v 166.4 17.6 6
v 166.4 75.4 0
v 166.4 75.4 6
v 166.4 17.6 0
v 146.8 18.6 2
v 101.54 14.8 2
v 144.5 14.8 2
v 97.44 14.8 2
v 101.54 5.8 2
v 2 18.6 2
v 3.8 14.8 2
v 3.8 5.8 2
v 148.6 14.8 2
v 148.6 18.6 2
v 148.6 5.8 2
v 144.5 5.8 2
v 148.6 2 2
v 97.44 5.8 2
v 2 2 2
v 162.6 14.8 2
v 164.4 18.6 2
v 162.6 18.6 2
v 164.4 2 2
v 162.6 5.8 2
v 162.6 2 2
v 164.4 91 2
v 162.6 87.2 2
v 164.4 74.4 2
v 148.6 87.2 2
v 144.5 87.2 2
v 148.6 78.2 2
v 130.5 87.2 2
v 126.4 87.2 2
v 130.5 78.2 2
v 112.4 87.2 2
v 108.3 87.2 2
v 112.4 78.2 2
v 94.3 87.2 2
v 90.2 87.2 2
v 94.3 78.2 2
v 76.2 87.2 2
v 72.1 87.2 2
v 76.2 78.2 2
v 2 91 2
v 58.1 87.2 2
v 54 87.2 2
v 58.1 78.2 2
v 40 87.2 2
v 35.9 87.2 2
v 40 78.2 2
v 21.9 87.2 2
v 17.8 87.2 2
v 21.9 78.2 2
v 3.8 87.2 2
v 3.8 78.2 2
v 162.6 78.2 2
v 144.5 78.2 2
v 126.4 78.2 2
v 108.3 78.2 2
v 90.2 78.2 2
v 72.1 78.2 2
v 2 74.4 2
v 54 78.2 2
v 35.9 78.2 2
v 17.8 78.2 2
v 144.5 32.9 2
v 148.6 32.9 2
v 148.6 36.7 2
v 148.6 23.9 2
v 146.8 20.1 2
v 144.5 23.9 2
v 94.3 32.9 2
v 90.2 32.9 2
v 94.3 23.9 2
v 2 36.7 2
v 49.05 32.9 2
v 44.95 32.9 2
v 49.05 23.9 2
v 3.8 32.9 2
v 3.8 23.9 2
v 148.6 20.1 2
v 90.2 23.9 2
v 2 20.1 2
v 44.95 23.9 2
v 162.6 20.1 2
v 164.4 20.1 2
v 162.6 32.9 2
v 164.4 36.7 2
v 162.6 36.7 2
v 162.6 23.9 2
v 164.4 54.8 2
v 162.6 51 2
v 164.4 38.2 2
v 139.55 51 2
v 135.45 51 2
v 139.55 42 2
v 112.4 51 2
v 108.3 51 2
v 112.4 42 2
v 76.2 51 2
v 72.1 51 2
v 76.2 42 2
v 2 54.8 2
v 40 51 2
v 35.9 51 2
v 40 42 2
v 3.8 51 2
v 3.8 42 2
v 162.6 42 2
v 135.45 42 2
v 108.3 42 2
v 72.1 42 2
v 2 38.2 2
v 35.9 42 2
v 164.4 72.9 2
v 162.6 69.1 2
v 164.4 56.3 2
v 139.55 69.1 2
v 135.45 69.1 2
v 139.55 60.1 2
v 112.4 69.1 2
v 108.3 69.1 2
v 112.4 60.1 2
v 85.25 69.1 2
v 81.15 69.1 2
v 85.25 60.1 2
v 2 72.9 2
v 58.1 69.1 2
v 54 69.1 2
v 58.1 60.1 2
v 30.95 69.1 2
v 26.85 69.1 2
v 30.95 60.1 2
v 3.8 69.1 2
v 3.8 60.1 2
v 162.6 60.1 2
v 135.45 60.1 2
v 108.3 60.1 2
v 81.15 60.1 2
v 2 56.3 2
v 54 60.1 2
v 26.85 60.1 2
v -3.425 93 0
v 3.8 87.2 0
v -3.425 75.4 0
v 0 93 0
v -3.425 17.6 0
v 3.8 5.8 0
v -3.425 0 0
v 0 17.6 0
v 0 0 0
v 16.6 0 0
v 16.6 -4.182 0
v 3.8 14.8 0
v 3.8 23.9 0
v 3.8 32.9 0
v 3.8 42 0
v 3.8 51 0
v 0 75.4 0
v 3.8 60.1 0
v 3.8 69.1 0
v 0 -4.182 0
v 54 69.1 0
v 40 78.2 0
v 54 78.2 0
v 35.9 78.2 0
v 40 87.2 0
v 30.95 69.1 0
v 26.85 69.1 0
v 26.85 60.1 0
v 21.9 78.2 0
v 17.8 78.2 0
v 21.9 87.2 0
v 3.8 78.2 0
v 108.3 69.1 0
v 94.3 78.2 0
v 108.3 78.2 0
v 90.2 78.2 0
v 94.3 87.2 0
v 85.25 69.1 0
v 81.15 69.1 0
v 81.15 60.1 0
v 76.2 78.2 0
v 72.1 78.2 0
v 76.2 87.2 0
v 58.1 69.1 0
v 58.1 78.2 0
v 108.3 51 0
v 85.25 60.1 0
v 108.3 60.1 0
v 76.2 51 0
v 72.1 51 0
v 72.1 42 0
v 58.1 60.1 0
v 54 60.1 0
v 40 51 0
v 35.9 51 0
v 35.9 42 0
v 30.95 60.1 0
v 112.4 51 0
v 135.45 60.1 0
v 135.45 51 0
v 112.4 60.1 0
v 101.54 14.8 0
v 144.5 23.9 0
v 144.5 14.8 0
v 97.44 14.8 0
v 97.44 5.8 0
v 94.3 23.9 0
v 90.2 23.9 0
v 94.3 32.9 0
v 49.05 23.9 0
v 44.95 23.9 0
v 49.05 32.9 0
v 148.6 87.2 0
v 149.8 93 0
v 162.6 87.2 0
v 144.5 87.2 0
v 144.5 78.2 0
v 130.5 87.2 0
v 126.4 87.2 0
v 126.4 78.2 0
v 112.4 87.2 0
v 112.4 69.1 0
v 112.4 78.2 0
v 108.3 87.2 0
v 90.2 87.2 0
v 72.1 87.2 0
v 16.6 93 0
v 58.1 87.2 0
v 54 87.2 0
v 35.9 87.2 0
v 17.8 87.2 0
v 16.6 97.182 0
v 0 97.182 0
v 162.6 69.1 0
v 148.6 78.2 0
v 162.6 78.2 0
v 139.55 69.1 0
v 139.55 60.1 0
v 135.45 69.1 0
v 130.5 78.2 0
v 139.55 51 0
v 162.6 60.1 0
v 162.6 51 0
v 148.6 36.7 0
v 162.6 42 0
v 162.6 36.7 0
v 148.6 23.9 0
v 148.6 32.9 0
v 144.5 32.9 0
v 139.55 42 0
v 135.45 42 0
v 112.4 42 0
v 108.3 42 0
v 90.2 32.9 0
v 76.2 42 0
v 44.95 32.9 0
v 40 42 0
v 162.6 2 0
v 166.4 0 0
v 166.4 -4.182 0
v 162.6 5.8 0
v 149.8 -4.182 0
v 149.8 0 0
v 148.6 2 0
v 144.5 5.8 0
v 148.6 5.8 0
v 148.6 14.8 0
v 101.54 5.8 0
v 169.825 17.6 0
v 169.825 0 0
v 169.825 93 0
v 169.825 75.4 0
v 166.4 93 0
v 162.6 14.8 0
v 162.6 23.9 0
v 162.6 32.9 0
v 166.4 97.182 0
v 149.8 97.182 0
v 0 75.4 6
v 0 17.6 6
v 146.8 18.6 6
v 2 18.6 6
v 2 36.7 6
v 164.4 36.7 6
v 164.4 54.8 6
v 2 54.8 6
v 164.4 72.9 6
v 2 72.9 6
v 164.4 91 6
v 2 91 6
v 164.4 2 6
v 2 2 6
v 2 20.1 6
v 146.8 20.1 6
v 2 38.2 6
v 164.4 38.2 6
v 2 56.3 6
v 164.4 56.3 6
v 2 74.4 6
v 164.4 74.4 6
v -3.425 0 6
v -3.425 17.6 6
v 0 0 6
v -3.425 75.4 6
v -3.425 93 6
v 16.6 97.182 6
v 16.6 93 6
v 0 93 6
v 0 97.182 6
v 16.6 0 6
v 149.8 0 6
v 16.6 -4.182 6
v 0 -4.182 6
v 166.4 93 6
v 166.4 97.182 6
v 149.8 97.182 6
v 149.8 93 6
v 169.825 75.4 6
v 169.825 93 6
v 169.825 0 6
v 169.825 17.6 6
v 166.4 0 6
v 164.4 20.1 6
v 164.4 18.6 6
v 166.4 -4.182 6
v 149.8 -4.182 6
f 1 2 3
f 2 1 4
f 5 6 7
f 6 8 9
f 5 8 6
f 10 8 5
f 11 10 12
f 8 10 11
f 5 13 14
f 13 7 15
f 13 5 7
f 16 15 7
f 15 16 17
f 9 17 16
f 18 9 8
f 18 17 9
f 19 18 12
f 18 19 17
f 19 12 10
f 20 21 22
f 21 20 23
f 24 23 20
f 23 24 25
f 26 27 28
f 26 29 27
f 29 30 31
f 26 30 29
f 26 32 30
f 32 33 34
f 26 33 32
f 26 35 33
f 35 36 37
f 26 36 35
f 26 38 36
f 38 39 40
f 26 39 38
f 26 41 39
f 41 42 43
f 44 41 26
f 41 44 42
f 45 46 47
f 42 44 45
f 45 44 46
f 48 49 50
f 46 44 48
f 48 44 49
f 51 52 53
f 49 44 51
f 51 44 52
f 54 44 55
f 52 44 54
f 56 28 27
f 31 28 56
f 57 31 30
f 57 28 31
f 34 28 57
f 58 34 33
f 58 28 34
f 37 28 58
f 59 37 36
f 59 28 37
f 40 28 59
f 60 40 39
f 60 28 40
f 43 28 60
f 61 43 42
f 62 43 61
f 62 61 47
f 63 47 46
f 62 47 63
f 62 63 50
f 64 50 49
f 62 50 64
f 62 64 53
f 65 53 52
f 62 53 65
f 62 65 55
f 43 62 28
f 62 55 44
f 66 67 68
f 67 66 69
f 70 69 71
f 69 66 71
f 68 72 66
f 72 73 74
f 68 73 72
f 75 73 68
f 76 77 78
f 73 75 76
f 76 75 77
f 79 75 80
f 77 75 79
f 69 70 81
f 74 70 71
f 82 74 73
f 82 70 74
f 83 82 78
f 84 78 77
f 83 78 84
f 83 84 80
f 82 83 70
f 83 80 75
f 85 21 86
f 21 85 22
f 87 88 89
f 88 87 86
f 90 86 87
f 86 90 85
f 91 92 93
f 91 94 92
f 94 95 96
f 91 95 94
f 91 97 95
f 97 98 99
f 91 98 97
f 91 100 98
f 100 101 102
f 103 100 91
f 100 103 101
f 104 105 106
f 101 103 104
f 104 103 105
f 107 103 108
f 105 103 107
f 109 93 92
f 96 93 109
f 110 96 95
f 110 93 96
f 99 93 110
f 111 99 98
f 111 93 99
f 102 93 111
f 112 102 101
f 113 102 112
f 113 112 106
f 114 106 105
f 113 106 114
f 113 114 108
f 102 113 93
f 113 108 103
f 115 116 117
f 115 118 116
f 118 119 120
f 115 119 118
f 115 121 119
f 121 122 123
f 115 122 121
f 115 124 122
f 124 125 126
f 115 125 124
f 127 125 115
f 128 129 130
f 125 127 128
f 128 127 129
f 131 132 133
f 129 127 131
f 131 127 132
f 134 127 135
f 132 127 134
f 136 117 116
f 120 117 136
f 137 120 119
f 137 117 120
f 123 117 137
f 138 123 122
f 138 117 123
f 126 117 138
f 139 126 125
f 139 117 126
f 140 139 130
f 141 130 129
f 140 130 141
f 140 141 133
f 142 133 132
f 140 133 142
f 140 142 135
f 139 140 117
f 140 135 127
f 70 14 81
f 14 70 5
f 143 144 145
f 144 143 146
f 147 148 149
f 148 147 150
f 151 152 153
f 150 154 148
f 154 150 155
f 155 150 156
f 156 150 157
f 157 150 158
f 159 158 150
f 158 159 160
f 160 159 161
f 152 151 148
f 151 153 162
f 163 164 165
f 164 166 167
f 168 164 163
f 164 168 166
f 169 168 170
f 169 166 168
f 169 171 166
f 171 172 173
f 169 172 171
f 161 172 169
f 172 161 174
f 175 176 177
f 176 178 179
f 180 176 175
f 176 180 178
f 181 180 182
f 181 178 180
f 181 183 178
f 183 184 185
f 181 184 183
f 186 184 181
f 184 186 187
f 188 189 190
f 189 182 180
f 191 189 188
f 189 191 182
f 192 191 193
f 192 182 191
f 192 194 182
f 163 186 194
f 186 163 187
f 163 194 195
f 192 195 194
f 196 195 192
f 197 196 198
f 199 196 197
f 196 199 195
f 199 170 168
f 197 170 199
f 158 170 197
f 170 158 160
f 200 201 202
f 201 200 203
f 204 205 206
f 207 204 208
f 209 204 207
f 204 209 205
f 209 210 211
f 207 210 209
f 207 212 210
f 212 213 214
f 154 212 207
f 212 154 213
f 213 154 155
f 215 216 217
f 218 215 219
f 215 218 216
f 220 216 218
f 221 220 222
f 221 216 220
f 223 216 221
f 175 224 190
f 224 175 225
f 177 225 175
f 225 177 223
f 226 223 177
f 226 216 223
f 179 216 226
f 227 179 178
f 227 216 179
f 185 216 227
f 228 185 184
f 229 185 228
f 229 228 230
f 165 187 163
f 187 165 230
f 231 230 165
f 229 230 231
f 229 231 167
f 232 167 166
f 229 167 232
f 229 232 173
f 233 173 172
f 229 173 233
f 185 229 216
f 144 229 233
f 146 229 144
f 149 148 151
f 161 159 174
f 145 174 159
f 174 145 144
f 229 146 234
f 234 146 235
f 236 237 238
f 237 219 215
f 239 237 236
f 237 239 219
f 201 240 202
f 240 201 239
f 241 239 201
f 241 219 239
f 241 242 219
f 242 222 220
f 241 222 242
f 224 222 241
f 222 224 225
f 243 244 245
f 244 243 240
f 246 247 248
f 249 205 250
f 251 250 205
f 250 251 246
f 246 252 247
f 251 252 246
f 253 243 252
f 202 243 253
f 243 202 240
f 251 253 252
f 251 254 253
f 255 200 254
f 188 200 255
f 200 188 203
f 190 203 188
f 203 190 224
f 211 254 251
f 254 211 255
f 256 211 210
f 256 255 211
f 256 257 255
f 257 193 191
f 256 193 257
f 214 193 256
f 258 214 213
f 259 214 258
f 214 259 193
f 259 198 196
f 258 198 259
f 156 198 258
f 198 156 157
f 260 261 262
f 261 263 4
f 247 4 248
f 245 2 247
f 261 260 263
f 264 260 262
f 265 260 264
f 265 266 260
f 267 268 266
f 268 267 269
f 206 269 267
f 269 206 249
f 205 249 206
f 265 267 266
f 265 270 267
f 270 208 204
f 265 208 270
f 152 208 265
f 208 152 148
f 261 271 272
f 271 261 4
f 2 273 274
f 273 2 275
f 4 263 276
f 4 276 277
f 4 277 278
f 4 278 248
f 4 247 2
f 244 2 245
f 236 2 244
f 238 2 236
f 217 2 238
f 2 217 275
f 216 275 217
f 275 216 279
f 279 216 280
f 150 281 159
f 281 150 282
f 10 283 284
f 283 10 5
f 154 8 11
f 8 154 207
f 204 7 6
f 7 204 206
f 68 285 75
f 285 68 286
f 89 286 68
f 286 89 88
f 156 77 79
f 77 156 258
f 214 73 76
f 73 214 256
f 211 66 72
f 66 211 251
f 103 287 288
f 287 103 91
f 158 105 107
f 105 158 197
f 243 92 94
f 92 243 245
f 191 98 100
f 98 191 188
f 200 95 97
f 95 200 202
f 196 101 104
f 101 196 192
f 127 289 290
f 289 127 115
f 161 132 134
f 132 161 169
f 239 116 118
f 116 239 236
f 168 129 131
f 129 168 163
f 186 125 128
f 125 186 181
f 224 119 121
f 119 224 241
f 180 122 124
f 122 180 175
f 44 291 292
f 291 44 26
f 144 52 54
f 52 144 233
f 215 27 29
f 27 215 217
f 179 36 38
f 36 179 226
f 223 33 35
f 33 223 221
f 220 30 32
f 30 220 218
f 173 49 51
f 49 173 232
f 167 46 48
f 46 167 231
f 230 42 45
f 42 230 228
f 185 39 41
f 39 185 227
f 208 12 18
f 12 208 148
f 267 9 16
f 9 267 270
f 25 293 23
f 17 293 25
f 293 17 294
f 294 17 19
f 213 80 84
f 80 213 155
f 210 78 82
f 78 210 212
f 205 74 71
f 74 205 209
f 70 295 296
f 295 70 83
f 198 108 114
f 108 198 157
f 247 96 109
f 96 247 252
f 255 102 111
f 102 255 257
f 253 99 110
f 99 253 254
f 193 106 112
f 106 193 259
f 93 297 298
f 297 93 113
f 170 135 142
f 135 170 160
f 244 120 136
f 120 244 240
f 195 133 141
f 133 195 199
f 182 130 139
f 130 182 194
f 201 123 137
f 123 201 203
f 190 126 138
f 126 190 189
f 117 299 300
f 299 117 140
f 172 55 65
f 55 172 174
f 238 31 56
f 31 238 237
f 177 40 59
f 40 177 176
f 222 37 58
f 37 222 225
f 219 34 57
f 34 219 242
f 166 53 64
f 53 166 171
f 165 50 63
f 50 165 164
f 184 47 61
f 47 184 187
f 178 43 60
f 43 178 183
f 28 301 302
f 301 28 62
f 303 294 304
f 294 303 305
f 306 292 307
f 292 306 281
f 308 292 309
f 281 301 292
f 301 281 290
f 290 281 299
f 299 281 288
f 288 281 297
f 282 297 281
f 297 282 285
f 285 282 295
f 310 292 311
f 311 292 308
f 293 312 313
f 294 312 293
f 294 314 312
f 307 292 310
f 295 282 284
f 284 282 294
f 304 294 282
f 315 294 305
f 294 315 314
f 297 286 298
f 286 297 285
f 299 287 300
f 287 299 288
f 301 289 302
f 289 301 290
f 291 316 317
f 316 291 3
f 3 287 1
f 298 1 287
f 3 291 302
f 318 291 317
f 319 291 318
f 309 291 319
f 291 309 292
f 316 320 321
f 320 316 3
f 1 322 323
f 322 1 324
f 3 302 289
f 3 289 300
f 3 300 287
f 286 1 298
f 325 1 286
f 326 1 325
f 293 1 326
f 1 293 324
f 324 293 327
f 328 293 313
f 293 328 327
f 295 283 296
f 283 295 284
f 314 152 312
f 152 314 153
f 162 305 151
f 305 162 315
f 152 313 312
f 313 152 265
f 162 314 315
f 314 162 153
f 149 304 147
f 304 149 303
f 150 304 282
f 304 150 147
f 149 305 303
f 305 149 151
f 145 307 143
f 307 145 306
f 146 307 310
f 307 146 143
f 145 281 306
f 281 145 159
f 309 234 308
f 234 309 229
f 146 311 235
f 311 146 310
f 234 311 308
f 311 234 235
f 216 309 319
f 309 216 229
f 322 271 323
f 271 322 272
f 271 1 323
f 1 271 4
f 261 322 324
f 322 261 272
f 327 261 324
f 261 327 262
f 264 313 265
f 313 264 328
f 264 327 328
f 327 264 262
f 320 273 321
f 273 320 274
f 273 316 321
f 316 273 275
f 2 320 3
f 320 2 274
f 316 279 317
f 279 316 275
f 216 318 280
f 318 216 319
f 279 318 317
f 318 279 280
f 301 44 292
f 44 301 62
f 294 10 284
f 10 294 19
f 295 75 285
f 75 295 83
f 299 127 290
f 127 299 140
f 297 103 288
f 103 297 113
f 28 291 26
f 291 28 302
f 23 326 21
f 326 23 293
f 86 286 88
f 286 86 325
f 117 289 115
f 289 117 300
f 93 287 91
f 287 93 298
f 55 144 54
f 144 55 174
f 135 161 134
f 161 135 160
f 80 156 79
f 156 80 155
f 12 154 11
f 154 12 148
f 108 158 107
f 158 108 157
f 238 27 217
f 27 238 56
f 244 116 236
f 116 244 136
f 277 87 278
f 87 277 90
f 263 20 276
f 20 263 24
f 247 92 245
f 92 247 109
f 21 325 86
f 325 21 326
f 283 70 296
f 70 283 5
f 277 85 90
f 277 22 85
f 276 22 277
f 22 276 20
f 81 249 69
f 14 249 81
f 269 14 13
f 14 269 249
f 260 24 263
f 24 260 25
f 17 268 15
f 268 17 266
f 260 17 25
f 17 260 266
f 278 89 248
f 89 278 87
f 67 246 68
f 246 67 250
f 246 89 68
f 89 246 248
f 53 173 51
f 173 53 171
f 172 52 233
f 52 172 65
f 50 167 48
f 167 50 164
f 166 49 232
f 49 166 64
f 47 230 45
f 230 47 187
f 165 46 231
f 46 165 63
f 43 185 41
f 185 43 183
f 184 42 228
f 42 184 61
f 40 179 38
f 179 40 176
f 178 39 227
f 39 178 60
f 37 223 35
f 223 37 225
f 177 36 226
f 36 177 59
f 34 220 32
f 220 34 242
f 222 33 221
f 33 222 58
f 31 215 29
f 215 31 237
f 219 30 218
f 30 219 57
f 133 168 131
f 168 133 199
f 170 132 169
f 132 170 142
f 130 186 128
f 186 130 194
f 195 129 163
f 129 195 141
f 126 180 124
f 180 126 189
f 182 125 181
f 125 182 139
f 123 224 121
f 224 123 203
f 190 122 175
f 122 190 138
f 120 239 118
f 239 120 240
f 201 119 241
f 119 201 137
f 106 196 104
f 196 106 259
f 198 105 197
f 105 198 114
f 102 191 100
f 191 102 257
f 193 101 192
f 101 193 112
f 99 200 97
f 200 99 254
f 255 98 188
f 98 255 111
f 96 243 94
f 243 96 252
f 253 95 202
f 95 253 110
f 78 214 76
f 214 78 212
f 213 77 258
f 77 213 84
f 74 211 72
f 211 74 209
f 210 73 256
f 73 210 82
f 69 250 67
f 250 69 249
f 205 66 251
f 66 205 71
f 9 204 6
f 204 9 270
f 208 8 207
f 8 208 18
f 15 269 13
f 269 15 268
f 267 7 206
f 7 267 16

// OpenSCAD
// 鍵帽儲存托盤產生器
// Keycap Storage Tray Generator
include <KSTG_Base.SCAD>

// 可複製此樣板檔依照自己需求另存新檔
// 以便以檔案區隔樣式

// 存放盒子的大小:
//BoxSize_L1 = 190; //長度(水平)
//BoxSize_W1 = 120; //寬度(垂直)
//BoxSize_H1 = 55;  //高度


//A4紙的尺寸是210mm×297mm
//BoxSize_L1 = 297/2; //長度(水平)
//BoxSize_L1 = 297/15*7-5; //長度(水平)
//BoxSize_L1 = 297/15*8; //長度(水平)

//BoxSize_W1 = 210/2; //寬度(垂直)
//BoxSize_W1 = 210/11*5+1; //寬度(垂直)
//BoxSize_W1 = 210/11*6+1; //寬度(垂直)

//BoxSize_L1 = 308/16*9+0; //長度(水平)
//BoxSize_W1 = 223/11*5+0; //寬度(垂直)

BoxSize_L1 = 308/16*9+0; //長度(水平)
BoxSize_W1 = 223/11*5+0; //寬度(垂直)

BoxSize_H1 = 55;  //高度


// 外圍
Tray_Fence_T = 2;  //厚度
Tray_Fence_H = 4;  //高度

//放置鍵帽空間
Keycaps_Space_L = 17.6;
Keycaps_Space_W = 16.6;

// 分隔片
//Tray_Separator_T = 0.8;  //厚度
Tray_Separator_H = 4;  //高度 建議高於上一層與此層鍵帽間的空隙,避免運輸時鍵帽脫落跑到其他空間
Tray_Separator_L = 3;  //短隔板長度
Tray_Separator_T_L = 1.5;  //厚度 (長;水平) 
Tray_Separator_T_W = 0.5;  //厚度 (寬;垂直)

// 分隔片(長寬區分/尚未使用)
//Tray_Separator_H_L = 5;  //長(水平) 高度
//Tray_Separator_H_W = 5;  //寬(垂直) 高度

// 底板 分隔板往中心延伸的底板
Tray_Bottom_L = (Keycaps_Space_W-9)/2; //水平底板寬度
Tray_Bottom_W = (Keycaps_Space_L-14)/2; //垂直底板寬度
Tray_Bottom_T = 2; //底板厚度

//常見鍵帽高度表:
//SA  16.5mm  Cherry 9.4mm
//OEM 11.9mm  TAI HAO 14.8
//XDA 9.1mm   DSA 7.6
//ADA 8mm (18.2x18.2mm )
//適用於 Tray_Column_H 參數

//四角落立柱高度
//堆疊托盤時可墊高避免直接碰觸鍵帽
Tray_Column_H = 4; // 高度 可依照鍵帽高度調整
Tray_Column_T = 2;  // 厚度
Tray_Column_L = 30; // 長面長度
Tray_Column_W = 30; // 寬面長度 

//垂直分隔片樣式
// 0 不需要
// 1 全部
// 2 短隔板無垂直底板
// 3 短隔板有垂直底板
// 4 無隔板有垂直底板

Tray_VS_Type = 0;

//多餘空間處理方式
//How to use the extra space
// 0 不處理，照原本盒子大小產生外圍
// 1 不處理，僅列印鍵帽所需空間
// 2 角落填補剩餘空間
ExtraSpaceUse = 2;

//填補空間高度
ES_H = Tray_Column_H + Tray_Column_T; 
//ES_H = Tray_Separator_H + Tray_Separator_T;

//是否顯示文字標記 0關/1開
ShowText = 1 ;

//請參考F5後帶出的座標數值
//例如：
// Tray_Separator_Cut_L=[
// [1,1],[2,1],[3,1],[1,2]
// ];

//清除分隔片與底板

// 長(水平)分隔片 紅色
Tray_Separator_Cut_L=[
[9,1]
];
// 寬(垂直)分隔片 藍色 -vnm,     
Tray_Separator_Cut_W=[
];
// 交錯點 綠色 長寬分隔片交會處
// 須手動清除交錯點
Tray_Separator_Cut_C=[
];
// 長(水平)底板 紅色
Tray_Separator_Cut_LB=[
[9,1]
];
// 寬(垂直)底板 藍色
Tray_Separator_Cut_WB=[
];

// 長(水平)底板 僅上方 紅色
Tray_Separator_Cut_LBU=[
[9,0]
];

// 長(水平)底板 僅下方 紅色
Tray_Separator_Cut_LBD=[
[9,2]
];

//增加分隔片與底板

// 長(水平)分隔片 紅色
Tray_Separator_Put_L=[
];
// 寬(垂直)分隔片 藍色     
Tray_Separator_Put_W=[
];
// 交錯點 綠色 長寬分隔片交會處
// 須手動清除交錯點
Tray_Separator_Put_C=[
];
// 長(水平)底板 紅色
Tray_Separator_Put_LB=[
//[4,1],[4,3]
];
// 寬(垂直)底板 藍色
Tray_Separator_Put_WB=[
[1,5],[2,5],[3,5],[4,5],[5,5],[6,5],[7,5],[8,5],[9,5],
[1.5,4],[3,4],[4.5,4],[6,4],[7.5,4],
[2,3],[4,3],[6,3],[7.5,3],
[2.5,2],[5,2],[8,2],
[5.65-0.25,1],[8,1]
];

CreateKST();
